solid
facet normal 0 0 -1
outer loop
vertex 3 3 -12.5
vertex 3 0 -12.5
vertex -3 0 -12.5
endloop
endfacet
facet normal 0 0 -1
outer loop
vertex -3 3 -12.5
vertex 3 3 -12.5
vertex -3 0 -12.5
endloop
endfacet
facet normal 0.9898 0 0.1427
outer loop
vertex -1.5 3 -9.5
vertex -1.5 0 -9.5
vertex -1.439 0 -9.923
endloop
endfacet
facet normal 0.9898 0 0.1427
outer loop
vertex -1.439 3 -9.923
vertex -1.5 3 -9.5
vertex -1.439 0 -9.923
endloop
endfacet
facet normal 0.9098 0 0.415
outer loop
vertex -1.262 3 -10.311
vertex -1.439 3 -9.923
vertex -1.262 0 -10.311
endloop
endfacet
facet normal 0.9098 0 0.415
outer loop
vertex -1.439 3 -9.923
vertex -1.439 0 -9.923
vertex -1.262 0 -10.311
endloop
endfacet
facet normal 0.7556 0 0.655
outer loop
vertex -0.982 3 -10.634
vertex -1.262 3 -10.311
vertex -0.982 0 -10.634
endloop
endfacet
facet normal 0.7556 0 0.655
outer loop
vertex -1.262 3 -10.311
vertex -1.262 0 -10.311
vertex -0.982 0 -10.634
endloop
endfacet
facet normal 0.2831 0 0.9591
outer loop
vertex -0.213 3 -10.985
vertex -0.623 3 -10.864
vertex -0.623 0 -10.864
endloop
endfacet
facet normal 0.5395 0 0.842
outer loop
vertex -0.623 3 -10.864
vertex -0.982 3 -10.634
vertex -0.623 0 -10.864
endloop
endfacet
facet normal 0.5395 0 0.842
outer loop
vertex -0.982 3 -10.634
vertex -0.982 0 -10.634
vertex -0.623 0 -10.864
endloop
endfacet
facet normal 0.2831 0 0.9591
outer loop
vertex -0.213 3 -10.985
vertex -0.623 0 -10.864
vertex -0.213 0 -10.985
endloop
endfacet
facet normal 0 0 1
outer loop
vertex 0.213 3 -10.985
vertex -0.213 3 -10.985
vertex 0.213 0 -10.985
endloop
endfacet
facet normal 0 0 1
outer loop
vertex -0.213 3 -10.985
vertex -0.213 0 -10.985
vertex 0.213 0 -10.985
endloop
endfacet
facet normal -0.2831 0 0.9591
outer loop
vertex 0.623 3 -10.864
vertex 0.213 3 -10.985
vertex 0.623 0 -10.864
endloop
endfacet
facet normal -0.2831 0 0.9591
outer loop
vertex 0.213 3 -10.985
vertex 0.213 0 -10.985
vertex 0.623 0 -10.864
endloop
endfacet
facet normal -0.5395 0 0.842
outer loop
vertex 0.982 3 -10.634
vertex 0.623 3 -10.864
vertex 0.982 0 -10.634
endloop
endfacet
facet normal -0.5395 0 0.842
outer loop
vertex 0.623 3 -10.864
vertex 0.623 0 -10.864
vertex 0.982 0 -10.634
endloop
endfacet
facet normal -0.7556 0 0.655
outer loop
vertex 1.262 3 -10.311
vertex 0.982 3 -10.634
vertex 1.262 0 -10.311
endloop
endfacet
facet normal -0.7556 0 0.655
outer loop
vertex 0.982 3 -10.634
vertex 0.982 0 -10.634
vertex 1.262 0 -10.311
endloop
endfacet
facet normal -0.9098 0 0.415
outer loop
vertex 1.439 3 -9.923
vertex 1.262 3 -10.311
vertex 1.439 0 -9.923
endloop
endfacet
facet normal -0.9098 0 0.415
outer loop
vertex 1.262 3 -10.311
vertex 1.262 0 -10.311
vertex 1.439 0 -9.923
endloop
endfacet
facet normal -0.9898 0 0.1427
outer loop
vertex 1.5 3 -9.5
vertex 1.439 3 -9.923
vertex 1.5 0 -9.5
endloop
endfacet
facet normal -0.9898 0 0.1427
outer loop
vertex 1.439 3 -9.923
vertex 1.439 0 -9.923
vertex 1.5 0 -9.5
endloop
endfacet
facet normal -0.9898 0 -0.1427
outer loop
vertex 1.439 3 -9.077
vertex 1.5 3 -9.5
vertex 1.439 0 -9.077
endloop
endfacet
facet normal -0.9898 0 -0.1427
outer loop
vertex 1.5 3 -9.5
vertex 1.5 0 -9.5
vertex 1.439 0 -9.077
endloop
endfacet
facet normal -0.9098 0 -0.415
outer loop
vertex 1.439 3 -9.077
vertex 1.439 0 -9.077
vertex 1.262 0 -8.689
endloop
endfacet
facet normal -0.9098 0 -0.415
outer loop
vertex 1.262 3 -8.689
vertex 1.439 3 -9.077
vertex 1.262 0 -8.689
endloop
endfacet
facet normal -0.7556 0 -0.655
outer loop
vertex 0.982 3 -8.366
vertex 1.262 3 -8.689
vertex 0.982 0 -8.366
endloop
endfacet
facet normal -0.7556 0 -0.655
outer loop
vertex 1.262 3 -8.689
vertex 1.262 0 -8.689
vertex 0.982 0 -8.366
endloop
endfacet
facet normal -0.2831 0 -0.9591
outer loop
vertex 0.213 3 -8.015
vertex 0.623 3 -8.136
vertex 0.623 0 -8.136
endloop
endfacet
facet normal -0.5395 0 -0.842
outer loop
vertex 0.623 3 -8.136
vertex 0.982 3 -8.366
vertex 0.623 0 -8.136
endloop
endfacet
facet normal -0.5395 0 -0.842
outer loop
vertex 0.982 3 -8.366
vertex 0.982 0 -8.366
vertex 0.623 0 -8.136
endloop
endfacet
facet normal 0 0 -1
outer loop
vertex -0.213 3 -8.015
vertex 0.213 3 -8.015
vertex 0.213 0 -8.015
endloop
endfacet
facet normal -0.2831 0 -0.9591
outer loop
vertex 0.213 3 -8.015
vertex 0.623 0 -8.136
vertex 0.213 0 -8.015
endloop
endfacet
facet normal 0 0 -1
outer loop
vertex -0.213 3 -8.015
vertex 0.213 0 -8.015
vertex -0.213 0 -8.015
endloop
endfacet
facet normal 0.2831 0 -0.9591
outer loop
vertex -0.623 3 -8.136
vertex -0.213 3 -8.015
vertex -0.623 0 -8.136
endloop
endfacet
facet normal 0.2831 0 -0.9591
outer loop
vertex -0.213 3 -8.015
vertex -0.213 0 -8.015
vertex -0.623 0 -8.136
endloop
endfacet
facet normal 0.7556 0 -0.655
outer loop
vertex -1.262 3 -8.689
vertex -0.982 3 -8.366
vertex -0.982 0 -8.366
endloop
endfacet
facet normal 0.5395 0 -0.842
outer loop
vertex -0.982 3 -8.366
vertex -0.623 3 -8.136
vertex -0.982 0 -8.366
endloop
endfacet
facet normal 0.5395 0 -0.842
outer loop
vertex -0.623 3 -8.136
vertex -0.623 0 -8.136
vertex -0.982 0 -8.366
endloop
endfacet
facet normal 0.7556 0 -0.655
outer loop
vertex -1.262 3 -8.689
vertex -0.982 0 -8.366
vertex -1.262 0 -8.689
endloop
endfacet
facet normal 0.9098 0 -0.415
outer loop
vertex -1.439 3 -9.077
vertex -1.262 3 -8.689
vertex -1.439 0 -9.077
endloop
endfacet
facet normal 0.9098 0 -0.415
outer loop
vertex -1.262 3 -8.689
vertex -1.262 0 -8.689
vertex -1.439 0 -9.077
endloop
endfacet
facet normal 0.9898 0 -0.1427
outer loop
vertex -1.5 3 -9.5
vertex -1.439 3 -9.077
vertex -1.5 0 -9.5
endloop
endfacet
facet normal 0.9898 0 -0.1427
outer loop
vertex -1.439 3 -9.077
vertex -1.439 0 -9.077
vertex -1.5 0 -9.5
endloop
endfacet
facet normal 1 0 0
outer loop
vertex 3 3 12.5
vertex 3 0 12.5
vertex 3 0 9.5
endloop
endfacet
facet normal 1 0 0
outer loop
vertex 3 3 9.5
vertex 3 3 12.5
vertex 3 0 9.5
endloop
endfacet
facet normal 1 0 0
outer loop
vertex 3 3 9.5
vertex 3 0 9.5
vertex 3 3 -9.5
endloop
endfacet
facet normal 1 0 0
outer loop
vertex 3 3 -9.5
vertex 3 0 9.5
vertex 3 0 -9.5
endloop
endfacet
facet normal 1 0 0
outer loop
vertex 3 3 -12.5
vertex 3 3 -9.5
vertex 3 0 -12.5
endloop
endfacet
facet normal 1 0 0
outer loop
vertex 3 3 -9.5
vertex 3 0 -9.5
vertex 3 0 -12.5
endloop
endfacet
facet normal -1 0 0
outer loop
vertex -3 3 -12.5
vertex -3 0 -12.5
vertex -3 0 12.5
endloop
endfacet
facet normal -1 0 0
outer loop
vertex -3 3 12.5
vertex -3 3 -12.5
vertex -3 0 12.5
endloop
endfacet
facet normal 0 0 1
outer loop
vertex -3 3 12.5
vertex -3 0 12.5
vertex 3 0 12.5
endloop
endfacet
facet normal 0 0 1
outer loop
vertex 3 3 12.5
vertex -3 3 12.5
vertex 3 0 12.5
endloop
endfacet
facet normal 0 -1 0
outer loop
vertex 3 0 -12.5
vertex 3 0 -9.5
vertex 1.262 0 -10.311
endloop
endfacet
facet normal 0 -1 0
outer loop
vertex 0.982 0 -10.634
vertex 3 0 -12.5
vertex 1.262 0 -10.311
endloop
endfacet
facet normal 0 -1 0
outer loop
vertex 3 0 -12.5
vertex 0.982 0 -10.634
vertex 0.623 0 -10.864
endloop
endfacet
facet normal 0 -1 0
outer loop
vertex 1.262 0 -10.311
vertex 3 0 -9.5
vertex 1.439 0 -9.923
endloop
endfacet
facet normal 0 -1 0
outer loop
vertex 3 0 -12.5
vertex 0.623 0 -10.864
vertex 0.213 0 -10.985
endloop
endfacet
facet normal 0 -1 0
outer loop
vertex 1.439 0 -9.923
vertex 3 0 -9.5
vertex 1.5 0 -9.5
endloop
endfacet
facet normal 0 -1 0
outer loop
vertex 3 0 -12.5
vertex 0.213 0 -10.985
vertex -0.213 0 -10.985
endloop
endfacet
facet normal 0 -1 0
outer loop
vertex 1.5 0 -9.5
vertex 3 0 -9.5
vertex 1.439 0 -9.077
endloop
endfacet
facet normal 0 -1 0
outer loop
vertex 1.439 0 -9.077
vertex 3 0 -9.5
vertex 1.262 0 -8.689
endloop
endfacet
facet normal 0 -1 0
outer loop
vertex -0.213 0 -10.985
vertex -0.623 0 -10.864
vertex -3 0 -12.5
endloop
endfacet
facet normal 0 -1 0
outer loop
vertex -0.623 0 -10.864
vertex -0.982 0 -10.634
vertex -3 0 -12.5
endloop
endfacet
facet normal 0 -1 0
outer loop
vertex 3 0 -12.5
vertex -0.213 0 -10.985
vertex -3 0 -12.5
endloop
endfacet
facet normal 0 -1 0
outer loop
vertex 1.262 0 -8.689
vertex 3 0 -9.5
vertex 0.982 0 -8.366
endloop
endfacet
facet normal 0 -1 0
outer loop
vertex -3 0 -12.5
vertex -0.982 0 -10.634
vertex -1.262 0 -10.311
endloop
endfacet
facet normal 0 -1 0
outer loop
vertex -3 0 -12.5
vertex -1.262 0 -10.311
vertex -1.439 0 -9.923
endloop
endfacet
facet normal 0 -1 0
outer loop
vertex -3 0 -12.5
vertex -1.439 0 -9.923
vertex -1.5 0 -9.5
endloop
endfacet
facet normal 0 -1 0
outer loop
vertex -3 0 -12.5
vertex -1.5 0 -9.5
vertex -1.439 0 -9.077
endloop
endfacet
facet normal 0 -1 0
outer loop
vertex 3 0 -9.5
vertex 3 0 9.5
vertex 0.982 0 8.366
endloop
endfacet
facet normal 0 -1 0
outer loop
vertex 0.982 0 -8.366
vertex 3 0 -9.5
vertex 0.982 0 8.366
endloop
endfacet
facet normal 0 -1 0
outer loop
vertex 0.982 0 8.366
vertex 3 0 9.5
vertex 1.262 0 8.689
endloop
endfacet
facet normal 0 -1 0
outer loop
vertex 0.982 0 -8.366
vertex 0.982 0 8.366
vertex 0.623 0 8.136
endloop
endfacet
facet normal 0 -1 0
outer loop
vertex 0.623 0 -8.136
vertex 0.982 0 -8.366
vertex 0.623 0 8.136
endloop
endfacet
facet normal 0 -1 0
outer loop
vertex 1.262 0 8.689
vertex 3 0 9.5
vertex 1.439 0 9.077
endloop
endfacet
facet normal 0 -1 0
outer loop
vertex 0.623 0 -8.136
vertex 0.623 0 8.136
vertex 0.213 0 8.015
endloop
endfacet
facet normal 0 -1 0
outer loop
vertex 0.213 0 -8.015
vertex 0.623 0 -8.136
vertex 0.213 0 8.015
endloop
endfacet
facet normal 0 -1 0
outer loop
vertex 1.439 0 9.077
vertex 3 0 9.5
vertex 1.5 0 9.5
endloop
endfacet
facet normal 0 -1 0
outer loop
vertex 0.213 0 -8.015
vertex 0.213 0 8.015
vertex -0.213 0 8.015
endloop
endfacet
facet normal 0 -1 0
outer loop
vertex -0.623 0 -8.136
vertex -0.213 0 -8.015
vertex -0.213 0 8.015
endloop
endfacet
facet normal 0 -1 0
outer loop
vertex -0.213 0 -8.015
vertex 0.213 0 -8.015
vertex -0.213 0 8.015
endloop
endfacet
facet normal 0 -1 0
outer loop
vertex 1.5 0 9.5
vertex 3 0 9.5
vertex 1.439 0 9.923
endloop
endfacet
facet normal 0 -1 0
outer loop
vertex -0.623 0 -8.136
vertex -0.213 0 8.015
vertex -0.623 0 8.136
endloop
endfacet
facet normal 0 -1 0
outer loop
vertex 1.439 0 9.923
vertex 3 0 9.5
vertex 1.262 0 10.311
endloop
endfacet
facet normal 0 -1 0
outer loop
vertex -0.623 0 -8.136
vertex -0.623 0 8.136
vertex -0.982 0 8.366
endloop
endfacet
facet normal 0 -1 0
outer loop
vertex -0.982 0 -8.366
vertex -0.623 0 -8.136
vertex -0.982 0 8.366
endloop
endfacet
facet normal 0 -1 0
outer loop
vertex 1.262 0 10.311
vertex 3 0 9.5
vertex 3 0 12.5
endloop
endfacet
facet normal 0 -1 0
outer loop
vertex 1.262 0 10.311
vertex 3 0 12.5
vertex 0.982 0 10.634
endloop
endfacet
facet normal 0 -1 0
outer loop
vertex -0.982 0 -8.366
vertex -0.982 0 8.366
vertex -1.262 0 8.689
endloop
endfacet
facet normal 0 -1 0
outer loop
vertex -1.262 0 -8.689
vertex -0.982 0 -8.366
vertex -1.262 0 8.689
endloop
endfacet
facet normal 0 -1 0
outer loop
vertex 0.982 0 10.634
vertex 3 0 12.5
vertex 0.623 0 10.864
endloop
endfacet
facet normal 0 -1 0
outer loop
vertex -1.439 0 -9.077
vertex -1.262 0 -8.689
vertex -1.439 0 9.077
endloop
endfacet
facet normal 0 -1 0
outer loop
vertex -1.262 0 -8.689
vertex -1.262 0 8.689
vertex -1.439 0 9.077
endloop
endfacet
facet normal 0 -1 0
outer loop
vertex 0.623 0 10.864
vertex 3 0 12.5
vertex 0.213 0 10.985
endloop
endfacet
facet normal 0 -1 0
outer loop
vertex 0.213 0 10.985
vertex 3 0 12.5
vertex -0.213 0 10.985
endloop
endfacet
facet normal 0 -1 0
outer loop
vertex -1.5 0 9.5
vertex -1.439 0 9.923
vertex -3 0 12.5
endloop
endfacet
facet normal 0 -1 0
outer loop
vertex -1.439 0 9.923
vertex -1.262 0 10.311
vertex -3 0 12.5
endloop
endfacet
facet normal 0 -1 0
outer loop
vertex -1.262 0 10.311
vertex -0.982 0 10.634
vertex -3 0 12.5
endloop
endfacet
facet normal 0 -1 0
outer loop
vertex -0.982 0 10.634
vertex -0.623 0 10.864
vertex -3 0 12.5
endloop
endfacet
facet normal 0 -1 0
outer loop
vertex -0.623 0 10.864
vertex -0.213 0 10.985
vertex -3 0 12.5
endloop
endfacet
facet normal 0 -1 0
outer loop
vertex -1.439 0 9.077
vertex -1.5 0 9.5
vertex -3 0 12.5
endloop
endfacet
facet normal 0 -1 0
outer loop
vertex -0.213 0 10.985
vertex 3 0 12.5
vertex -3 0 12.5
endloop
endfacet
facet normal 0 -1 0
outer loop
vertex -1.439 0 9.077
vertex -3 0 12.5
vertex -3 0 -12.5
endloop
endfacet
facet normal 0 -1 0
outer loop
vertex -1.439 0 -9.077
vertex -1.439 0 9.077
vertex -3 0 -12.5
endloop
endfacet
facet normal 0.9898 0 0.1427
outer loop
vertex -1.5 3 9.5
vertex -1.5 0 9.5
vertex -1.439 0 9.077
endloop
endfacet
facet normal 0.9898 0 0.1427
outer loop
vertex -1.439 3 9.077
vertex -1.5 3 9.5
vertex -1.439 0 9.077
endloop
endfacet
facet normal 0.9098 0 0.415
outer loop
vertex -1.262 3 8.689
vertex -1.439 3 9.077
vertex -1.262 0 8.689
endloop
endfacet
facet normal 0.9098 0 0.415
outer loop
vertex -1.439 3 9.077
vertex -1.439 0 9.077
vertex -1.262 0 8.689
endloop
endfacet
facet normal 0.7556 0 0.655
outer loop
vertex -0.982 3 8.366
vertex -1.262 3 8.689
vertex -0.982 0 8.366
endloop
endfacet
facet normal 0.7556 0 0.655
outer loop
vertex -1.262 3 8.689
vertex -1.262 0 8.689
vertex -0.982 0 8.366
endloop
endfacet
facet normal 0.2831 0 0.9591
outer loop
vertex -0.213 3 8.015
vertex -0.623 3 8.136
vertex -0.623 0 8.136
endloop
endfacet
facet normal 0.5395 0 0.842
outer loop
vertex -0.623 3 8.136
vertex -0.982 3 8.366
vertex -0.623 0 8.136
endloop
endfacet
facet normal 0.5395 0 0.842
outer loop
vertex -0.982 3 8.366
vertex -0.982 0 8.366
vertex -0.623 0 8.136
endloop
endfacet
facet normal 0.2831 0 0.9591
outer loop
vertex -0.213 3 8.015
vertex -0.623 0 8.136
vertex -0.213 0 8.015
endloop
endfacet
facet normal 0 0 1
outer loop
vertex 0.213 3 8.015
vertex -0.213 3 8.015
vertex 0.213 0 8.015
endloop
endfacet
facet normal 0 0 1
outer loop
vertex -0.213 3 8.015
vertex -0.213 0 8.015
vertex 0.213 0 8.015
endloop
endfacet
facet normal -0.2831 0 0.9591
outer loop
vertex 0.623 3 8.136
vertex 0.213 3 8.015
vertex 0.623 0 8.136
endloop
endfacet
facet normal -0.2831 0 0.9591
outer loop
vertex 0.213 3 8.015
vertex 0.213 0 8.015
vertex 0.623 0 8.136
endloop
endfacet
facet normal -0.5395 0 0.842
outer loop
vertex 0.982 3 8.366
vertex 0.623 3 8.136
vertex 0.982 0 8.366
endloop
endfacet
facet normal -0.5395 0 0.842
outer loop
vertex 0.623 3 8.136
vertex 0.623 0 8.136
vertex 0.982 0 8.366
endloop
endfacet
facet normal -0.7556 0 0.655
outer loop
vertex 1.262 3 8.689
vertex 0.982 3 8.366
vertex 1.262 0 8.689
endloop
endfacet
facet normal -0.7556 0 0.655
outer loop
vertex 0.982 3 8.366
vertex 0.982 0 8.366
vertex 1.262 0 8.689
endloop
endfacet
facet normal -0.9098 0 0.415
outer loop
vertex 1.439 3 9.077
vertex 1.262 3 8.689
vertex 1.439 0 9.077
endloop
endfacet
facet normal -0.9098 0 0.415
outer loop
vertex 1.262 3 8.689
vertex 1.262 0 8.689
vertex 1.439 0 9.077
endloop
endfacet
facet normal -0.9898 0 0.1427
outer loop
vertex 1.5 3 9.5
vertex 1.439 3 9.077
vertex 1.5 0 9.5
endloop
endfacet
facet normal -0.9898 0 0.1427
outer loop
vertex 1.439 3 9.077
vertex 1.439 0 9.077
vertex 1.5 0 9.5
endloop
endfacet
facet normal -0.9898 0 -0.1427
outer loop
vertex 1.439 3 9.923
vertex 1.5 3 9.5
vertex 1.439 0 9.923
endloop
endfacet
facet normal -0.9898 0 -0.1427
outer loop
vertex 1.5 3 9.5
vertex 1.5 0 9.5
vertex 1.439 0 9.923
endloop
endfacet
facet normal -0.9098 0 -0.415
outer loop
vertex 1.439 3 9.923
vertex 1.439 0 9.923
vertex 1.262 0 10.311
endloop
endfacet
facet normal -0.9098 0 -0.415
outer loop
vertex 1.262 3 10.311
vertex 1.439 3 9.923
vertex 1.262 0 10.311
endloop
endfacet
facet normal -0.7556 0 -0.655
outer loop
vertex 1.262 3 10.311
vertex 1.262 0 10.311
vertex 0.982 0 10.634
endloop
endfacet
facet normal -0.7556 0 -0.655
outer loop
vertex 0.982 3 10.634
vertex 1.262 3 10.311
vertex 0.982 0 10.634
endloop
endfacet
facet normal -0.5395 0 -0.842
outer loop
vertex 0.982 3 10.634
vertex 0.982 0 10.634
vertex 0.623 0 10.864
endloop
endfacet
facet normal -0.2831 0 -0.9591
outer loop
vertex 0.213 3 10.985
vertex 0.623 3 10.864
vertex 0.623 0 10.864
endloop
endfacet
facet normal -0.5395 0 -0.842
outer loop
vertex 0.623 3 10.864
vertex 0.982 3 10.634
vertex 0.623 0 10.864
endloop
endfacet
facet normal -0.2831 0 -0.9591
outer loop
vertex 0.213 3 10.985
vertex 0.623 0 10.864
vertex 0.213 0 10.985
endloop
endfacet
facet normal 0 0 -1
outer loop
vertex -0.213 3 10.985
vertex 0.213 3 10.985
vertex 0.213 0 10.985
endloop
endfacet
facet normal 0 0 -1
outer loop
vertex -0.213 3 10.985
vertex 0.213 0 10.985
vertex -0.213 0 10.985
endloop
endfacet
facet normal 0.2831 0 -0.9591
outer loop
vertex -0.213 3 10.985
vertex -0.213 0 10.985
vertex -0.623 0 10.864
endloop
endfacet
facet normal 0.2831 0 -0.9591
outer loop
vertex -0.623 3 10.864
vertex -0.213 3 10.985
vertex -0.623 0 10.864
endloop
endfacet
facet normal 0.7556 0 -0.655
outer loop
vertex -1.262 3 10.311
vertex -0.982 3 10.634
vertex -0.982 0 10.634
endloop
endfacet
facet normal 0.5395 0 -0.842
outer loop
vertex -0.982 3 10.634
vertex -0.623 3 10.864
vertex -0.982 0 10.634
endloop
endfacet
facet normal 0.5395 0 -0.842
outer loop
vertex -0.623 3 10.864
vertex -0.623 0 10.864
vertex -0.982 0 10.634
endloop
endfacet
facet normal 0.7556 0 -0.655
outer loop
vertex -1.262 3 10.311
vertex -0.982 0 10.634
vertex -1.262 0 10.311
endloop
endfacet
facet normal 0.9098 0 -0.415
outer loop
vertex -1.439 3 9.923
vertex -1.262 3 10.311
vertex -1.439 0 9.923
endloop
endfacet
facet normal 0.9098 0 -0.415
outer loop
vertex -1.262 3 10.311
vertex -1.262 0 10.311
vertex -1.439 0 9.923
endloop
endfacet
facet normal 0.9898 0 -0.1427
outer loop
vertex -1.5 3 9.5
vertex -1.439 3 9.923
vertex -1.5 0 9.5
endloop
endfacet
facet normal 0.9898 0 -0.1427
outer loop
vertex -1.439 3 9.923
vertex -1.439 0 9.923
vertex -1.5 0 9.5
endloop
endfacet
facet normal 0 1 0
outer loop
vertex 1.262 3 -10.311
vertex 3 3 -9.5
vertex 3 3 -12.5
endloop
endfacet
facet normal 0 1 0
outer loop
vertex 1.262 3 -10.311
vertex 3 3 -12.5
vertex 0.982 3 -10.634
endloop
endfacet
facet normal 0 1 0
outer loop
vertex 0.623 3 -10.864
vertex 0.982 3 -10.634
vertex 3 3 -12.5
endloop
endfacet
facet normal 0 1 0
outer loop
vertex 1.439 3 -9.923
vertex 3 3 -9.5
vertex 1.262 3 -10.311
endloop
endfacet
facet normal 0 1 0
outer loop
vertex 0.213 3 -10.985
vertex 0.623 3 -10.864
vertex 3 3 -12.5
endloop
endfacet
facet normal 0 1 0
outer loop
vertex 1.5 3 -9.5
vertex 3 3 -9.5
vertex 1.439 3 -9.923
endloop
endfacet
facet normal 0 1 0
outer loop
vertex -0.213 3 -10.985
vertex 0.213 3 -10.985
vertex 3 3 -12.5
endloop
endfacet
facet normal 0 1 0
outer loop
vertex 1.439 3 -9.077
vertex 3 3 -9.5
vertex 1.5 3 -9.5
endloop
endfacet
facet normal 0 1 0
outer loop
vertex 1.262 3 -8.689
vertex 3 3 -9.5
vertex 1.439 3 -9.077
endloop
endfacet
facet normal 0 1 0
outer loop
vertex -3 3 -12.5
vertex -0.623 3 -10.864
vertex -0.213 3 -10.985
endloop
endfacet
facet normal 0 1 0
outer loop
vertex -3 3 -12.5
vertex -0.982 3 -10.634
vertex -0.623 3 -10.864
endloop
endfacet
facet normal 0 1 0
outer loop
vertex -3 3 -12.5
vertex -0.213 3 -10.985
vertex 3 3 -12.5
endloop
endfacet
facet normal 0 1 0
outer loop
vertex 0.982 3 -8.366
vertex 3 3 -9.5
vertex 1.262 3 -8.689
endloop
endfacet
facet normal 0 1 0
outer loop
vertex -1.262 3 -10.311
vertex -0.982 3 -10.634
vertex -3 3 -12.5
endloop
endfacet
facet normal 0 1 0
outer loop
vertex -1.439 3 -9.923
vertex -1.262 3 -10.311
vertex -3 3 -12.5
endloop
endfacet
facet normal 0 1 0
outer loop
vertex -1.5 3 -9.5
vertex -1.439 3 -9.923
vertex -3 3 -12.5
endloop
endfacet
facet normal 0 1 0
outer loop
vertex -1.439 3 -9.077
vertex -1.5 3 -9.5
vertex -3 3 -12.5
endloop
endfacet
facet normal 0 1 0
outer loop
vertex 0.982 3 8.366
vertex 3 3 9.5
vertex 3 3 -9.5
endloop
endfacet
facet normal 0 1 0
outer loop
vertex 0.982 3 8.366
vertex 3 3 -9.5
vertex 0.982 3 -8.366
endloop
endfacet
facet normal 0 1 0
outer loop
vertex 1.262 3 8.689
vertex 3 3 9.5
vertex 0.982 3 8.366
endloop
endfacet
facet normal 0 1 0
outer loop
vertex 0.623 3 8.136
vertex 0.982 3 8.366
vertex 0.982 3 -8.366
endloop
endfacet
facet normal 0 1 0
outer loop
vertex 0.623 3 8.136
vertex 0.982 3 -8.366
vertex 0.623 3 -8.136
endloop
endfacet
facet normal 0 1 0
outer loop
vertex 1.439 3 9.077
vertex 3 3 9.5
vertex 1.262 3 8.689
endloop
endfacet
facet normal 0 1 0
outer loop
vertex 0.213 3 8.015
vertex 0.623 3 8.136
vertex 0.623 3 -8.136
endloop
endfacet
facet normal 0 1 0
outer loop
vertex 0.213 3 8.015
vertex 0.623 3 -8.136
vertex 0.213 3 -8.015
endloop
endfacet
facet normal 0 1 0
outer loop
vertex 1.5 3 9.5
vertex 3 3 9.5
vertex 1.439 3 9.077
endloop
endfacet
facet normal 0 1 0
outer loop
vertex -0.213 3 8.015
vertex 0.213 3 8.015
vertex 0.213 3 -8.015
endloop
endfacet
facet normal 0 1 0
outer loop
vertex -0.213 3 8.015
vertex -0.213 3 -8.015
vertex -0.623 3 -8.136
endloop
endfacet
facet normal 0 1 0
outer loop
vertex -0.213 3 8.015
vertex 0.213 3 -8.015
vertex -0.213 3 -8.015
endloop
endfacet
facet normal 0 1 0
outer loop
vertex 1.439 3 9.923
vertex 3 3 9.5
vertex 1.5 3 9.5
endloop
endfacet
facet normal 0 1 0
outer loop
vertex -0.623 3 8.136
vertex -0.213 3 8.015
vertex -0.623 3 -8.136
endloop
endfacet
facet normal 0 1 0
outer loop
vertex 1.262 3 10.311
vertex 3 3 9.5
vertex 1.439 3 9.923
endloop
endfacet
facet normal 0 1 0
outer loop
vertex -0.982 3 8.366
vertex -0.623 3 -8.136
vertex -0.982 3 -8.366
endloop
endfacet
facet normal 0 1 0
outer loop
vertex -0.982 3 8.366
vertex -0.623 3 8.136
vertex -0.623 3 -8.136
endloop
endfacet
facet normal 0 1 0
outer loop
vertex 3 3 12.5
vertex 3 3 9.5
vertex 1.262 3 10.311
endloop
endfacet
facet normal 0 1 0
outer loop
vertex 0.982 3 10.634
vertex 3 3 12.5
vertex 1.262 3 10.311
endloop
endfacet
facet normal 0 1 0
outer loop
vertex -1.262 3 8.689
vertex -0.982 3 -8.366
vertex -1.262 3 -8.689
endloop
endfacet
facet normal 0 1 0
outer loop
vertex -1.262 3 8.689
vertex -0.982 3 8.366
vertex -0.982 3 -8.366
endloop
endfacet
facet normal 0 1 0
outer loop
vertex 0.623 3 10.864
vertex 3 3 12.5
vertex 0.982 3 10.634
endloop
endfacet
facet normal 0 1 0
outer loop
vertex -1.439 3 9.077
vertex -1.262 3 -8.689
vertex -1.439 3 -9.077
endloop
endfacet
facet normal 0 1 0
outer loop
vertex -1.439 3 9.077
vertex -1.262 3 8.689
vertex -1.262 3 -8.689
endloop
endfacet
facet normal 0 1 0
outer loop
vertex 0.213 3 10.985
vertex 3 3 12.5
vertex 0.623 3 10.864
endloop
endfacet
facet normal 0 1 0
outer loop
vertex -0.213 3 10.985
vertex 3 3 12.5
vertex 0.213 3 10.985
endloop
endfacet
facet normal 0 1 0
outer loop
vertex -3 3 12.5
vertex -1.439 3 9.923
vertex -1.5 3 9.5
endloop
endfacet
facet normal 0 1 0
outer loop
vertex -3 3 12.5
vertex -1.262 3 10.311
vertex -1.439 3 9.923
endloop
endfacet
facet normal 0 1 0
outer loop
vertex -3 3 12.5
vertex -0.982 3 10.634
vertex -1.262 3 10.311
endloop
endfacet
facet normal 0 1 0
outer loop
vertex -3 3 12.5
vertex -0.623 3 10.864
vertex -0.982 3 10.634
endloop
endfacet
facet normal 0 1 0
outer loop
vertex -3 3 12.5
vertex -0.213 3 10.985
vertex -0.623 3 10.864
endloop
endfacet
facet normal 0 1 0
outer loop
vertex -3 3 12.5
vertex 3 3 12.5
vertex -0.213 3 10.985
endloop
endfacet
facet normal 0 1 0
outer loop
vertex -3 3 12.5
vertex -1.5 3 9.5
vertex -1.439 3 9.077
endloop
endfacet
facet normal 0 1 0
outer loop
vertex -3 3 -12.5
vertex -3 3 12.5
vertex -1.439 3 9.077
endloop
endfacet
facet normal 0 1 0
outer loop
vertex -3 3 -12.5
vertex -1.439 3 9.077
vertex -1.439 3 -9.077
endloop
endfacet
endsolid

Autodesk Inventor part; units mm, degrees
ref_plane "YZ Plane" through (0, 0, 0) normal (1, 0, 0) x (0, 1, 0)
ref_plane "XZ Plane" through (0, 0, 0) normal (0, 1, 0) x (-1, 0, 0)
ref_plane "XY Plane" through (0, 0, 0) normal (0, 0, 1) x (1, 0, 0)
sketch "Sketch1" plane through (0, 0, 0) normal (0, 1, 0) x (-1, 0, 0)
  line L0 (3, 12.5) -> (-3, 12.5)
  line L1 (-3, 12.5) -> (-3, -12.5)
  line L2 (-3, -12.5) -> (3, -12.5)
  line L3 (3, -12.5) -> (3, 12.5)
  line L4 (3, 12.5) -> (-3, -12.5) construction
  line L5 (-3, 12.5) -> (3, -12.5) construction
  line L6 (-3, -12.5) -> (-3, -9.5)
  line L7 (-3, -9.5) -> (0, -9.5)
  circle A0 centre (0, -9.5) radius 1.5
  line L8 (-3, 12.5) -> (-3, 9.5)
  line L9 (-3, 9.5) -> (0, 9.5)
  circle A1 centre (0, 9.5) radius 1.5
  point P0 (0, 0)
  dimension "d0" = 6
  dimension "d1" = 25
  dimension "d4" = 3
  dimension "d5" = 3
  dimension "d6" = 3
  dimension "d7" = 3
  dimension "d8" = 3
  dimension "d9" = 3
extrude "Extrusion1" add sketch "Sketch1" along normal blind 3 contours A1 | A0 | L3 L2 L1 L0
extrude "Extrusion2" cut sketch "Sketch1" along normal blind 3 contours A0
extrude "Extrusion3" cut sketch "Sketch1" along normal blind 3 contours A1
properties part number "Akrilik Kabel SD Serayu"
